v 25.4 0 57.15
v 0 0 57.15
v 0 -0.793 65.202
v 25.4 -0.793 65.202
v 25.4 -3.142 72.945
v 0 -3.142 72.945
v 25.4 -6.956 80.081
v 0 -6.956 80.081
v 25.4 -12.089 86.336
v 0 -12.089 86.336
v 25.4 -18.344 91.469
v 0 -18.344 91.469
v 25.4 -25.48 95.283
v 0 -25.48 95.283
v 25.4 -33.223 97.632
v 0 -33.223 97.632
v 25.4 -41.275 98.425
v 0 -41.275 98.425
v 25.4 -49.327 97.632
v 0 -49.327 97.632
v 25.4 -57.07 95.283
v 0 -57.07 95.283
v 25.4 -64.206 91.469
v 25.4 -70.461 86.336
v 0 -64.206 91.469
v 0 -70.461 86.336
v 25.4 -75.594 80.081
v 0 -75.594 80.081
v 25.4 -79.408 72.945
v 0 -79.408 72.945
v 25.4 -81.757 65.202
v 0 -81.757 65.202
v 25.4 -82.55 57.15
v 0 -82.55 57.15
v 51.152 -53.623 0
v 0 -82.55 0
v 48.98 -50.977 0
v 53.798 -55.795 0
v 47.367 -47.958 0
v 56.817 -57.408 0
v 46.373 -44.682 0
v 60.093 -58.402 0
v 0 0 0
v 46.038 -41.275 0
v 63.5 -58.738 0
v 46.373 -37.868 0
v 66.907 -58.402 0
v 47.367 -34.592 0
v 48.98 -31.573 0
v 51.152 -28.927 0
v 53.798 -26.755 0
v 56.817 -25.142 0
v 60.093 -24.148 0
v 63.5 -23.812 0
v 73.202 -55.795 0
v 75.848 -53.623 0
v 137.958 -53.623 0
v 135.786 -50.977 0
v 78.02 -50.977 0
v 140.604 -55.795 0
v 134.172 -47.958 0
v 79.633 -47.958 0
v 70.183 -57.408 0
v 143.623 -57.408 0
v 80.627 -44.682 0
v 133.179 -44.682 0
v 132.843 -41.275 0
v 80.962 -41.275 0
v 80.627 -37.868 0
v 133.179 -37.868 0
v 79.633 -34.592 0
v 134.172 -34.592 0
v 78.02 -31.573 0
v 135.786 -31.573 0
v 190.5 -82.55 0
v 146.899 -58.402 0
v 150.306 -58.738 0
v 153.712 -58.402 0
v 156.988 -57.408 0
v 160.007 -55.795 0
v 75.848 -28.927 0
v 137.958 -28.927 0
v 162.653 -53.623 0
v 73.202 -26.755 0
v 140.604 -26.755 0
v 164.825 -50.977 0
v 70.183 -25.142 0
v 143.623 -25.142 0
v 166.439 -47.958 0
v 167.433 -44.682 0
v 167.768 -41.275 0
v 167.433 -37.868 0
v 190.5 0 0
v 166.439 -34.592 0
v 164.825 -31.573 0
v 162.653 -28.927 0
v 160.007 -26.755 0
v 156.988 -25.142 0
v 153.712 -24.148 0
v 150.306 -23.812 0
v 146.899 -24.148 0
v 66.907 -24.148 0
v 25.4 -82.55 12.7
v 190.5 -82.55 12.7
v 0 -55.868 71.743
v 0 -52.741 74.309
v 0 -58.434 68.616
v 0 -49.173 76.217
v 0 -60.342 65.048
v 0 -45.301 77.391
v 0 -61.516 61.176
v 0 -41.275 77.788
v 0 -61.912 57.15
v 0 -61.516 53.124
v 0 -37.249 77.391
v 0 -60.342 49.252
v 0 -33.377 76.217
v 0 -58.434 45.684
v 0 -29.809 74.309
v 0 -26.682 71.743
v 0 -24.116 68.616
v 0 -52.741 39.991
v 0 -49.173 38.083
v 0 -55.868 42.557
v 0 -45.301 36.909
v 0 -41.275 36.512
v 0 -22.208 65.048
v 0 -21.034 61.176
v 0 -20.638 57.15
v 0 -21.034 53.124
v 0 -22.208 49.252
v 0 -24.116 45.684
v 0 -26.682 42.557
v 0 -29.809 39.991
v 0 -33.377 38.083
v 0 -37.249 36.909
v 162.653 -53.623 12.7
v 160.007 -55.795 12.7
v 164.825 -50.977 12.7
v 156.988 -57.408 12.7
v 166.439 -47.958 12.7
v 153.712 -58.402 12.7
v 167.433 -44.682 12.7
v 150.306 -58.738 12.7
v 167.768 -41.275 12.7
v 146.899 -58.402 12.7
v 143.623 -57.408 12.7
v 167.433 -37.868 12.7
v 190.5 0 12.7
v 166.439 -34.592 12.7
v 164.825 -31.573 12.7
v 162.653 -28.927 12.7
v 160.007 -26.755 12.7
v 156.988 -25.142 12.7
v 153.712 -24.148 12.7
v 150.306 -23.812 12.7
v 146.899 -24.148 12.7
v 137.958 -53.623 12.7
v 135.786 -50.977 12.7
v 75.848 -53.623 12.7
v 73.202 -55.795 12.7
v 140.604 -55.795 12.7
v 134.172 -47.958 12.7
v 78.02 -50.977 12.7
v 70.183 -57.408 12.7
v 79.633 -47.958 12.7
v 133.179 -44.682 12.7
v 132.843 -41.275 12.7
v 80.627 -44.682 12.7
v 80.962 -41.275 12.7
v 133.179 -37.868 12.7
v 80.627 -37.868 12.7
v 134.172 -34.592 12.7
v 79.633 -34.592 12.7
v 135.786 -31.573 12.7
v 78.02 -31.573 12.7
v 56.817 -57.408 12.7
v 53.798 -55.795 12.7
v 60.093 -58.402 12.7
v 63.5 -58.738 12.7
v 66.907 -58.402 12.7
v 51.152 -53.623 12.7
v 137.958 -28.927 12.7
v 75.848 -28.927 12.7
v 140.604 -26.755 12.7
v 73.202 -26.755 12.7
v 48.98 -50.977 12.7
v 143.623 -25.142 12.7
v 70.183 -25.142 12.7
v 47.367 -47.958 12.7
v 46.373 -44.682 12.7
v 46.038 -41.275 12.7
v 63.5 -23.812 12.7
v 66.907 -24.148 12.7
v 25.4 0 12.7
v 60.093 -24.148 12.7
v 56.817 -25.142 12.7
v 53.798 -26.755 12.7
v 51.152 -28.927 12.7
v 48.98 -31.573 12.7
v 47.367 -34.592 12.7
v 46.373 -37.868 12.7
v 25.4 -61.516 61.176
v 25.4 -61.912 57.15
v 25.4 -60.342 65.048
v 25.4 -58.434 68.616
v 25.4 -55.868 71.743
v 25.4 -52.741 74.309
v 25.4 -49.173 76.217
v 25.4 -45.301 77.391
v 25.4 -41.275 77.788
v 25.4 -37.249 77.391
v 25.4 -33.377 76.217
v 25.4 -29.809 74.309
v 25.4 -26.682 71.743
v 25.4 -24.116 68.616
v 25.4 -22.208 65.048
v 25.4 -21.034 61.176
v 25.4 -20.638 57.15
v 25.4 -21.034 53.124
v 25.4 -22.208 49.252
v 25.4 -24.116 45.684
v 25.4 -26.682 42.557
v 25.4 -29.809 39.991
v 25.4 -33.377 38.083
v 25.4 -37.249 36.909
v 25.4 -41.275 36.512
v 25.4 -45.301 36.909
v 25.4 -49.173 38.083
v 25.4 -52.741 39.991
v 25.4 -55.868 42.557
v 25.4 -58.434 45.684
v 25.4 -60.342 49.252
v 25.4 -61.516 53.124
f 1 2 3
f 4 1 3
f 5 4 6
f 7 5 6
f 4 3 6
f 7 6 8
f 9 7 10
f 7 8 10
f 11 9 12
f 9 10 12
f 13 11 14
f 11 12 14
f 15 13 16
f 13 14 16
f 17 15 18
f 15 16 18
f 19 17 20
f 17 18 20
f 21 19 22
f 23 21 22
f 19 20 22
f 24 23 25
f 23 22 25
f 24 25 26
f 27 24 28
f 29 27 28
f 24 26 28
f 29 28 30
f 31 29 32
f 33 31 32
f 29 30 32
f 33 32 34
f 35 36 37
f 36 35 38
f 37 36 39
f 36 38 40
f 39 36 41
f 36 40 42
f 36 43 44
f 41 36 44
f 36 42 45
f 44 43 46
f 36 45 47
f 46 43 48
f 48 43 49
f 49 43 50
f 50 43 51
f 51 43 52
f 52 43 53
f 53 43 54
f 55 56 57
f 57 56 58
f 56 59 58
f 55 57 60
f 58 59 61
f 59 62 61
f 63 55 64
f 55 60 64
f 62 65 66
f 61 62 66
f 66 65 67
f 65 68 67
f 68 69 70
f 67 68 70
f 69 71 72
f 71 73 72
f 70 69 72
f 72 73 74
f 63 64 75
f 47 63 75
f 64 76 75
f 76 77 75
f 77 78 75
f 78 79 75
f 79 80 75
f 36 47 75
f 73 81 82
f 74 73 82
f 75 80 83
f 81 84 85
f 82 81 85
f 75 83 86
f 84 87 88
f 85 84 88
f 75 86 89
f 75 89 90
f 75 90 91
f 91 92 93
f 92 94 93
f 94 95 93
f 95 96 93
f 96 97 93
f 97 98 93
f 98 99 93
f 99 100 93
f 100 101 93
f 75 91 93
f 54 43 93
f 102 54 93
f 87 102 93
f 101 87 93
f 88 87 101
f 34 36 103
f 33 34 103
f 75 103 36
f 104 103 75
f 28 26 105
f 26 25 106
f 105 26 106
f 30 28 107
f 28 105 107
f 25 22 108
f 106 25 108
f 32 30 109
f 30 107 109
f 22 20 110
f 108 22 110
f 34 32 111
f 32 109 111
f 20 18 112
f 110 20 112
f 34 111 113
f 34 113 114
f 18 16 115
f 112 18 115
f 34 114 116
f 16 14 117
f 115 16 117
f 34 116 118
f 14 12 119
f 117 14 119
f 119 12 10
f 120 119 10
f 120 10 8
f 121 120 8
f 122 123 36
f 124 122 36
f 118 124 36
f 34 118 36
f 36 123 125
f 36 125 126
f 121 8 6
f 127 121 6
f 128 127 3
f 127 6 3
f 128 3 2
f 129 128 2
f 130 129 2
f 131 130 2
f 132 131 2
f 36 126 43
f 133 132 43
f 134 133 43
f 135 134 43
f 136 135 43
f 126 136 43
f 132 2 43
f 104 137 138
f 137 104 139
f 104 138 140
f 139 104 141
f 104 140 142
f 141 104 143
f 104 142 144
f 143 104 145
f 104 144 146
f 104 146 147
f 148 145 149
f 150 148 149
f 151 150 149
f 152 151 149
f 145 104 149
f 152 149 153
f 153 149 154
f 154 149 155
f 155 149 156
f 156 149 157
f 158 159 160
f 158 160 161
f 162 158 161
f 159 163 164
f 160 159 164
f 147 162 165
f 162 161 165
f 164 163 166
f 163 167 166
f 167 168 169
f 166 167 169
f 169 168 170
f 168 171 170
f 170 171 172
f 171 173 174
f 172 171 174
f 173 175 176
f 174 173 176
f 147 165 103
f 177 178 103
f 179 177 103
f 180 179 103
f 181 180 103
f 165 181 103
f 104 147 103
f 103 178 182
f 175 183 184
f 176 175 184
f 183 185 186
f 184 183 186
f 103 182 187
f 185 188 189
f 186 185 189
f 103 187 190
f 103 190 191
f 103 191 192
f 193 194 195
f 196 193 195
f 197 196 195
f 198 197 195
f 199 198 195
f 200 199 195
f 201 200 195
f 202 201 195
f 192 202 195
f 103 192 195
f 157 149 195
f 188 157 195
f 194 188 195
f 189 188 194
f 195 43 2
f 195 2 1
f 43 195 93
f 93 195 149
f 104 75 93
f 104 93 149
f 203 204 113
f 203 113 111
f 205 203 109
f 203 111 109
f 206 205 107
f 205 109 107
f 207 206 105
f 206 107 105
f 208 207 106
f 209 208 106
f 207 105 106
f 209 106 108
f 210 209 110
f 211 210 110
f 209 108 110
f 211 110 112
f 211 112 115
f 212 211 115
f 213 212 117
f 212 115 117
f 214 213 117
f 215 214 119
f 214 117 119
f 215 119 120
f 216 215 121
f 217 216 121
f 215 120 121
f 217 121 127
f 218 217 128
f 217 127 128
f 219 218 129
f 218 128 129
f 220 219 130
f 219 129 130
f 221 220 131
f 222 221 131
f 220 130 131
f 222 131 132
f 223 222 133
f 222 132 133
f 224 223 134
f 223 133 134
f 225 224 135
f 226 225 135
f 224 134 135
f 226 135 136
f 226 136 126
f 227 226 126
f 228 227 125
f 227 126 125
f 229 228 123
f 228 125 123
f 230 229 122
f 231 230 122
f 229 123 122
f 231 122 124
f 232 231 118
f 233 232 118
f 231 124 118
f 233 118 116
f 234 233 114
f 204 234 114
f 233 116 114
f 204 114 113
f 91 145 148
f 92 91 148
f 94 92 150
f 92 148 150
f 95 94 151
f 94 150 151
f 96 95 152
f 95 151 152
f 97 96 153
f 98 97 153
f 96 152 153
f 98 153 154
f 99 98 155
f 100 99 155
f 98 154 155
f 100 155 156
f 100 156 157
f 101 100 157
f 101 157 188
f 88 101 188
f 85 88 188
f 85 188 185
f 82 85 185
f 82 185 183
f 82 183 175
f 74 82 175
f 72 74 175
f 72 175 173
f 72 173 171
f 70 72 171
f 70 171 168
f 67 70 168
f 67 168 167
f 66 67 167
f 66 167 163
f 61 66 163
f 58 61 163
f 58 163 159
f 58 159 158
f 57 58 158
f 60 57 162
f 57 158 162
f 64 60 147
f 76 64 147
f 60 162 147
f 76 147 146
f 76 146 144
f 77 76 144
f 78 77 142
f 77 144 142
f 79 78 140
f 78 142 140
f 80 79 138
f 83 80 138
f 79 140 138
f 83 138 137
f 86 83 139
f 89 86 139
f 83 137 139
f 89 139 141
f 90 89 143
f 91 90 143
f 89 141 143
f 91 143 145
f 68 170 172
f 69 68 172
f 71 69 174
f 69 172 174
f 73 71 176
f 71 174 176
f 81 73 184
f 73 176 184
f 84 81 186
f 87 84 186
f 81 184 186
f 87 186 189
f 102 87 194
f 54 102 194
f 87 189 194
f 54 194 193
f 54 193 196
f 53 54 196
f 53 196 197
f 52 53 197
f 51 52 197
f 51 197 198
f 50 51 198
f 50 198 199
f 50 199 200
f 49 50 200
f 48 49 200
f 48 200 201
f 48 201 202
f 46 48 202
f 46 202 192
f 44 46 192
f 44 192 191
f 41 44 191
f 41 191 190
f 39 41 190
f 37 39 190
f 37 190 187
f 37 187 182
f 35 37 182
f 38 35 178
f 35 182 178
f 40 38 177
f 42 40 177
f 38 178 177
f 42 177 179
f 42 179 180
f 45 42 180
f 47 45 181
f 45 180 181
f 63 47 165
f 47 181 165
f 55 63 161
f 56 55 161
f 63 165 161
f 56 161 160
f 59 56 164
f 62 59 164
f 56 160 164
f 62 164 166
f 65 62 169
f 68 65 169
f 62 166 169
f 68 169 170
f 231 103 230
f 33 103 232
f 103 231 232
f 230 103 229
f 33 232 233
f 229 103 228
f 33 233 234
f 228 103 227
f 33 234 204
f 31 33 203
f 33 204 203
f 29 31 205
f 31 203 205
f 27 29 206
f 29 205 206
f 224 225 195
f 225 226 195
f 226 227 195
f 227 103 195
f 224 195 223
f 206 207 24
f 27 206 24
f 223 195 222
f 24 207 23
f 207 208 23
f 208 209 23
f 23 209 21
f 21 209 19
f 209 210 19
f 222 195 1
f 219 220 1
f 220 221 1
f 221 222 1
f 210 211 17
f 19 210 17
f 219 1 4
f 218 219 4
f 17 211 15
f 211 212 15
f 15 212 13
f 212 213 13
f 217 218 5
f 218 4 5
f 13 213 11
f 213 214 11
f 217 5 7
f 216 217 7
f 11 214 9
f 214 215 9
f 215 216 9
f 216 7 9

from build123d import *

# Parameters (mm, degrees)
F1_DEPTH = 82.55
F2_R     = 17.4625
F3_DEPTH = 25.4
F5_DEPTH = 25.4
F6_R     = 20.6375
F7_DEPTH = 25.4


with BuildPart() as f1:
    # F0 (on Front) → F1 (new body)
    with BuildSketch(Plane.XZ):
        Polygon((0, 107.95), (0, 0), (190.5, 0), (190.5, 12.7), (25.4, 12.7), (25.4, 107.95), align=None)
    extrude(amount=F1_DEPTH)

    # F2 (on face) → F3 (cut)
    with BuildSketch(Plane.XY.offset(12.7)):
        with Locations((63.5, -41.275)):
            Circle(F2_R)
        with Locations((150.305644, -41.275)):
            Circle(F2_R)
    extrude(amount=-F3_DEPTH, mode=Mode.SUBTRACT)

    # F4 (on face) → F5 (cut)
    with BuildSketch(Plane(origin=(0, 0, 0), x_dir=(0, -1, 0), z_dir=(-1, 0, 0))):
        with BuildLine():
            ThreePointArc((0, 57.15), (41.275, 98.425), (82.55, 57.15))
            Line((82.55, 57.15), (82.55, 107.95))
            Line((82.55, 107.95), (0, 107.95))
            Line((0, 107.95), (0, 57.15))
        make_face()
    extrude(amount=-F5_DEPTH, mode=Mode.SUBTRACT)

    # F6 (on face) → F7 (cut, through all)
    with BuildSketch(Plane(origin=(0, 0, 0), x_dir=(0, -1, 0), z_dir=(-1, 0, 0))):
        with Locations((41.275, 57.15)):
            Circle(F6_R)
    extrude(amount=-F7_DEPTH, mode=Mode.SUBTRACT)


solid = f1.part
